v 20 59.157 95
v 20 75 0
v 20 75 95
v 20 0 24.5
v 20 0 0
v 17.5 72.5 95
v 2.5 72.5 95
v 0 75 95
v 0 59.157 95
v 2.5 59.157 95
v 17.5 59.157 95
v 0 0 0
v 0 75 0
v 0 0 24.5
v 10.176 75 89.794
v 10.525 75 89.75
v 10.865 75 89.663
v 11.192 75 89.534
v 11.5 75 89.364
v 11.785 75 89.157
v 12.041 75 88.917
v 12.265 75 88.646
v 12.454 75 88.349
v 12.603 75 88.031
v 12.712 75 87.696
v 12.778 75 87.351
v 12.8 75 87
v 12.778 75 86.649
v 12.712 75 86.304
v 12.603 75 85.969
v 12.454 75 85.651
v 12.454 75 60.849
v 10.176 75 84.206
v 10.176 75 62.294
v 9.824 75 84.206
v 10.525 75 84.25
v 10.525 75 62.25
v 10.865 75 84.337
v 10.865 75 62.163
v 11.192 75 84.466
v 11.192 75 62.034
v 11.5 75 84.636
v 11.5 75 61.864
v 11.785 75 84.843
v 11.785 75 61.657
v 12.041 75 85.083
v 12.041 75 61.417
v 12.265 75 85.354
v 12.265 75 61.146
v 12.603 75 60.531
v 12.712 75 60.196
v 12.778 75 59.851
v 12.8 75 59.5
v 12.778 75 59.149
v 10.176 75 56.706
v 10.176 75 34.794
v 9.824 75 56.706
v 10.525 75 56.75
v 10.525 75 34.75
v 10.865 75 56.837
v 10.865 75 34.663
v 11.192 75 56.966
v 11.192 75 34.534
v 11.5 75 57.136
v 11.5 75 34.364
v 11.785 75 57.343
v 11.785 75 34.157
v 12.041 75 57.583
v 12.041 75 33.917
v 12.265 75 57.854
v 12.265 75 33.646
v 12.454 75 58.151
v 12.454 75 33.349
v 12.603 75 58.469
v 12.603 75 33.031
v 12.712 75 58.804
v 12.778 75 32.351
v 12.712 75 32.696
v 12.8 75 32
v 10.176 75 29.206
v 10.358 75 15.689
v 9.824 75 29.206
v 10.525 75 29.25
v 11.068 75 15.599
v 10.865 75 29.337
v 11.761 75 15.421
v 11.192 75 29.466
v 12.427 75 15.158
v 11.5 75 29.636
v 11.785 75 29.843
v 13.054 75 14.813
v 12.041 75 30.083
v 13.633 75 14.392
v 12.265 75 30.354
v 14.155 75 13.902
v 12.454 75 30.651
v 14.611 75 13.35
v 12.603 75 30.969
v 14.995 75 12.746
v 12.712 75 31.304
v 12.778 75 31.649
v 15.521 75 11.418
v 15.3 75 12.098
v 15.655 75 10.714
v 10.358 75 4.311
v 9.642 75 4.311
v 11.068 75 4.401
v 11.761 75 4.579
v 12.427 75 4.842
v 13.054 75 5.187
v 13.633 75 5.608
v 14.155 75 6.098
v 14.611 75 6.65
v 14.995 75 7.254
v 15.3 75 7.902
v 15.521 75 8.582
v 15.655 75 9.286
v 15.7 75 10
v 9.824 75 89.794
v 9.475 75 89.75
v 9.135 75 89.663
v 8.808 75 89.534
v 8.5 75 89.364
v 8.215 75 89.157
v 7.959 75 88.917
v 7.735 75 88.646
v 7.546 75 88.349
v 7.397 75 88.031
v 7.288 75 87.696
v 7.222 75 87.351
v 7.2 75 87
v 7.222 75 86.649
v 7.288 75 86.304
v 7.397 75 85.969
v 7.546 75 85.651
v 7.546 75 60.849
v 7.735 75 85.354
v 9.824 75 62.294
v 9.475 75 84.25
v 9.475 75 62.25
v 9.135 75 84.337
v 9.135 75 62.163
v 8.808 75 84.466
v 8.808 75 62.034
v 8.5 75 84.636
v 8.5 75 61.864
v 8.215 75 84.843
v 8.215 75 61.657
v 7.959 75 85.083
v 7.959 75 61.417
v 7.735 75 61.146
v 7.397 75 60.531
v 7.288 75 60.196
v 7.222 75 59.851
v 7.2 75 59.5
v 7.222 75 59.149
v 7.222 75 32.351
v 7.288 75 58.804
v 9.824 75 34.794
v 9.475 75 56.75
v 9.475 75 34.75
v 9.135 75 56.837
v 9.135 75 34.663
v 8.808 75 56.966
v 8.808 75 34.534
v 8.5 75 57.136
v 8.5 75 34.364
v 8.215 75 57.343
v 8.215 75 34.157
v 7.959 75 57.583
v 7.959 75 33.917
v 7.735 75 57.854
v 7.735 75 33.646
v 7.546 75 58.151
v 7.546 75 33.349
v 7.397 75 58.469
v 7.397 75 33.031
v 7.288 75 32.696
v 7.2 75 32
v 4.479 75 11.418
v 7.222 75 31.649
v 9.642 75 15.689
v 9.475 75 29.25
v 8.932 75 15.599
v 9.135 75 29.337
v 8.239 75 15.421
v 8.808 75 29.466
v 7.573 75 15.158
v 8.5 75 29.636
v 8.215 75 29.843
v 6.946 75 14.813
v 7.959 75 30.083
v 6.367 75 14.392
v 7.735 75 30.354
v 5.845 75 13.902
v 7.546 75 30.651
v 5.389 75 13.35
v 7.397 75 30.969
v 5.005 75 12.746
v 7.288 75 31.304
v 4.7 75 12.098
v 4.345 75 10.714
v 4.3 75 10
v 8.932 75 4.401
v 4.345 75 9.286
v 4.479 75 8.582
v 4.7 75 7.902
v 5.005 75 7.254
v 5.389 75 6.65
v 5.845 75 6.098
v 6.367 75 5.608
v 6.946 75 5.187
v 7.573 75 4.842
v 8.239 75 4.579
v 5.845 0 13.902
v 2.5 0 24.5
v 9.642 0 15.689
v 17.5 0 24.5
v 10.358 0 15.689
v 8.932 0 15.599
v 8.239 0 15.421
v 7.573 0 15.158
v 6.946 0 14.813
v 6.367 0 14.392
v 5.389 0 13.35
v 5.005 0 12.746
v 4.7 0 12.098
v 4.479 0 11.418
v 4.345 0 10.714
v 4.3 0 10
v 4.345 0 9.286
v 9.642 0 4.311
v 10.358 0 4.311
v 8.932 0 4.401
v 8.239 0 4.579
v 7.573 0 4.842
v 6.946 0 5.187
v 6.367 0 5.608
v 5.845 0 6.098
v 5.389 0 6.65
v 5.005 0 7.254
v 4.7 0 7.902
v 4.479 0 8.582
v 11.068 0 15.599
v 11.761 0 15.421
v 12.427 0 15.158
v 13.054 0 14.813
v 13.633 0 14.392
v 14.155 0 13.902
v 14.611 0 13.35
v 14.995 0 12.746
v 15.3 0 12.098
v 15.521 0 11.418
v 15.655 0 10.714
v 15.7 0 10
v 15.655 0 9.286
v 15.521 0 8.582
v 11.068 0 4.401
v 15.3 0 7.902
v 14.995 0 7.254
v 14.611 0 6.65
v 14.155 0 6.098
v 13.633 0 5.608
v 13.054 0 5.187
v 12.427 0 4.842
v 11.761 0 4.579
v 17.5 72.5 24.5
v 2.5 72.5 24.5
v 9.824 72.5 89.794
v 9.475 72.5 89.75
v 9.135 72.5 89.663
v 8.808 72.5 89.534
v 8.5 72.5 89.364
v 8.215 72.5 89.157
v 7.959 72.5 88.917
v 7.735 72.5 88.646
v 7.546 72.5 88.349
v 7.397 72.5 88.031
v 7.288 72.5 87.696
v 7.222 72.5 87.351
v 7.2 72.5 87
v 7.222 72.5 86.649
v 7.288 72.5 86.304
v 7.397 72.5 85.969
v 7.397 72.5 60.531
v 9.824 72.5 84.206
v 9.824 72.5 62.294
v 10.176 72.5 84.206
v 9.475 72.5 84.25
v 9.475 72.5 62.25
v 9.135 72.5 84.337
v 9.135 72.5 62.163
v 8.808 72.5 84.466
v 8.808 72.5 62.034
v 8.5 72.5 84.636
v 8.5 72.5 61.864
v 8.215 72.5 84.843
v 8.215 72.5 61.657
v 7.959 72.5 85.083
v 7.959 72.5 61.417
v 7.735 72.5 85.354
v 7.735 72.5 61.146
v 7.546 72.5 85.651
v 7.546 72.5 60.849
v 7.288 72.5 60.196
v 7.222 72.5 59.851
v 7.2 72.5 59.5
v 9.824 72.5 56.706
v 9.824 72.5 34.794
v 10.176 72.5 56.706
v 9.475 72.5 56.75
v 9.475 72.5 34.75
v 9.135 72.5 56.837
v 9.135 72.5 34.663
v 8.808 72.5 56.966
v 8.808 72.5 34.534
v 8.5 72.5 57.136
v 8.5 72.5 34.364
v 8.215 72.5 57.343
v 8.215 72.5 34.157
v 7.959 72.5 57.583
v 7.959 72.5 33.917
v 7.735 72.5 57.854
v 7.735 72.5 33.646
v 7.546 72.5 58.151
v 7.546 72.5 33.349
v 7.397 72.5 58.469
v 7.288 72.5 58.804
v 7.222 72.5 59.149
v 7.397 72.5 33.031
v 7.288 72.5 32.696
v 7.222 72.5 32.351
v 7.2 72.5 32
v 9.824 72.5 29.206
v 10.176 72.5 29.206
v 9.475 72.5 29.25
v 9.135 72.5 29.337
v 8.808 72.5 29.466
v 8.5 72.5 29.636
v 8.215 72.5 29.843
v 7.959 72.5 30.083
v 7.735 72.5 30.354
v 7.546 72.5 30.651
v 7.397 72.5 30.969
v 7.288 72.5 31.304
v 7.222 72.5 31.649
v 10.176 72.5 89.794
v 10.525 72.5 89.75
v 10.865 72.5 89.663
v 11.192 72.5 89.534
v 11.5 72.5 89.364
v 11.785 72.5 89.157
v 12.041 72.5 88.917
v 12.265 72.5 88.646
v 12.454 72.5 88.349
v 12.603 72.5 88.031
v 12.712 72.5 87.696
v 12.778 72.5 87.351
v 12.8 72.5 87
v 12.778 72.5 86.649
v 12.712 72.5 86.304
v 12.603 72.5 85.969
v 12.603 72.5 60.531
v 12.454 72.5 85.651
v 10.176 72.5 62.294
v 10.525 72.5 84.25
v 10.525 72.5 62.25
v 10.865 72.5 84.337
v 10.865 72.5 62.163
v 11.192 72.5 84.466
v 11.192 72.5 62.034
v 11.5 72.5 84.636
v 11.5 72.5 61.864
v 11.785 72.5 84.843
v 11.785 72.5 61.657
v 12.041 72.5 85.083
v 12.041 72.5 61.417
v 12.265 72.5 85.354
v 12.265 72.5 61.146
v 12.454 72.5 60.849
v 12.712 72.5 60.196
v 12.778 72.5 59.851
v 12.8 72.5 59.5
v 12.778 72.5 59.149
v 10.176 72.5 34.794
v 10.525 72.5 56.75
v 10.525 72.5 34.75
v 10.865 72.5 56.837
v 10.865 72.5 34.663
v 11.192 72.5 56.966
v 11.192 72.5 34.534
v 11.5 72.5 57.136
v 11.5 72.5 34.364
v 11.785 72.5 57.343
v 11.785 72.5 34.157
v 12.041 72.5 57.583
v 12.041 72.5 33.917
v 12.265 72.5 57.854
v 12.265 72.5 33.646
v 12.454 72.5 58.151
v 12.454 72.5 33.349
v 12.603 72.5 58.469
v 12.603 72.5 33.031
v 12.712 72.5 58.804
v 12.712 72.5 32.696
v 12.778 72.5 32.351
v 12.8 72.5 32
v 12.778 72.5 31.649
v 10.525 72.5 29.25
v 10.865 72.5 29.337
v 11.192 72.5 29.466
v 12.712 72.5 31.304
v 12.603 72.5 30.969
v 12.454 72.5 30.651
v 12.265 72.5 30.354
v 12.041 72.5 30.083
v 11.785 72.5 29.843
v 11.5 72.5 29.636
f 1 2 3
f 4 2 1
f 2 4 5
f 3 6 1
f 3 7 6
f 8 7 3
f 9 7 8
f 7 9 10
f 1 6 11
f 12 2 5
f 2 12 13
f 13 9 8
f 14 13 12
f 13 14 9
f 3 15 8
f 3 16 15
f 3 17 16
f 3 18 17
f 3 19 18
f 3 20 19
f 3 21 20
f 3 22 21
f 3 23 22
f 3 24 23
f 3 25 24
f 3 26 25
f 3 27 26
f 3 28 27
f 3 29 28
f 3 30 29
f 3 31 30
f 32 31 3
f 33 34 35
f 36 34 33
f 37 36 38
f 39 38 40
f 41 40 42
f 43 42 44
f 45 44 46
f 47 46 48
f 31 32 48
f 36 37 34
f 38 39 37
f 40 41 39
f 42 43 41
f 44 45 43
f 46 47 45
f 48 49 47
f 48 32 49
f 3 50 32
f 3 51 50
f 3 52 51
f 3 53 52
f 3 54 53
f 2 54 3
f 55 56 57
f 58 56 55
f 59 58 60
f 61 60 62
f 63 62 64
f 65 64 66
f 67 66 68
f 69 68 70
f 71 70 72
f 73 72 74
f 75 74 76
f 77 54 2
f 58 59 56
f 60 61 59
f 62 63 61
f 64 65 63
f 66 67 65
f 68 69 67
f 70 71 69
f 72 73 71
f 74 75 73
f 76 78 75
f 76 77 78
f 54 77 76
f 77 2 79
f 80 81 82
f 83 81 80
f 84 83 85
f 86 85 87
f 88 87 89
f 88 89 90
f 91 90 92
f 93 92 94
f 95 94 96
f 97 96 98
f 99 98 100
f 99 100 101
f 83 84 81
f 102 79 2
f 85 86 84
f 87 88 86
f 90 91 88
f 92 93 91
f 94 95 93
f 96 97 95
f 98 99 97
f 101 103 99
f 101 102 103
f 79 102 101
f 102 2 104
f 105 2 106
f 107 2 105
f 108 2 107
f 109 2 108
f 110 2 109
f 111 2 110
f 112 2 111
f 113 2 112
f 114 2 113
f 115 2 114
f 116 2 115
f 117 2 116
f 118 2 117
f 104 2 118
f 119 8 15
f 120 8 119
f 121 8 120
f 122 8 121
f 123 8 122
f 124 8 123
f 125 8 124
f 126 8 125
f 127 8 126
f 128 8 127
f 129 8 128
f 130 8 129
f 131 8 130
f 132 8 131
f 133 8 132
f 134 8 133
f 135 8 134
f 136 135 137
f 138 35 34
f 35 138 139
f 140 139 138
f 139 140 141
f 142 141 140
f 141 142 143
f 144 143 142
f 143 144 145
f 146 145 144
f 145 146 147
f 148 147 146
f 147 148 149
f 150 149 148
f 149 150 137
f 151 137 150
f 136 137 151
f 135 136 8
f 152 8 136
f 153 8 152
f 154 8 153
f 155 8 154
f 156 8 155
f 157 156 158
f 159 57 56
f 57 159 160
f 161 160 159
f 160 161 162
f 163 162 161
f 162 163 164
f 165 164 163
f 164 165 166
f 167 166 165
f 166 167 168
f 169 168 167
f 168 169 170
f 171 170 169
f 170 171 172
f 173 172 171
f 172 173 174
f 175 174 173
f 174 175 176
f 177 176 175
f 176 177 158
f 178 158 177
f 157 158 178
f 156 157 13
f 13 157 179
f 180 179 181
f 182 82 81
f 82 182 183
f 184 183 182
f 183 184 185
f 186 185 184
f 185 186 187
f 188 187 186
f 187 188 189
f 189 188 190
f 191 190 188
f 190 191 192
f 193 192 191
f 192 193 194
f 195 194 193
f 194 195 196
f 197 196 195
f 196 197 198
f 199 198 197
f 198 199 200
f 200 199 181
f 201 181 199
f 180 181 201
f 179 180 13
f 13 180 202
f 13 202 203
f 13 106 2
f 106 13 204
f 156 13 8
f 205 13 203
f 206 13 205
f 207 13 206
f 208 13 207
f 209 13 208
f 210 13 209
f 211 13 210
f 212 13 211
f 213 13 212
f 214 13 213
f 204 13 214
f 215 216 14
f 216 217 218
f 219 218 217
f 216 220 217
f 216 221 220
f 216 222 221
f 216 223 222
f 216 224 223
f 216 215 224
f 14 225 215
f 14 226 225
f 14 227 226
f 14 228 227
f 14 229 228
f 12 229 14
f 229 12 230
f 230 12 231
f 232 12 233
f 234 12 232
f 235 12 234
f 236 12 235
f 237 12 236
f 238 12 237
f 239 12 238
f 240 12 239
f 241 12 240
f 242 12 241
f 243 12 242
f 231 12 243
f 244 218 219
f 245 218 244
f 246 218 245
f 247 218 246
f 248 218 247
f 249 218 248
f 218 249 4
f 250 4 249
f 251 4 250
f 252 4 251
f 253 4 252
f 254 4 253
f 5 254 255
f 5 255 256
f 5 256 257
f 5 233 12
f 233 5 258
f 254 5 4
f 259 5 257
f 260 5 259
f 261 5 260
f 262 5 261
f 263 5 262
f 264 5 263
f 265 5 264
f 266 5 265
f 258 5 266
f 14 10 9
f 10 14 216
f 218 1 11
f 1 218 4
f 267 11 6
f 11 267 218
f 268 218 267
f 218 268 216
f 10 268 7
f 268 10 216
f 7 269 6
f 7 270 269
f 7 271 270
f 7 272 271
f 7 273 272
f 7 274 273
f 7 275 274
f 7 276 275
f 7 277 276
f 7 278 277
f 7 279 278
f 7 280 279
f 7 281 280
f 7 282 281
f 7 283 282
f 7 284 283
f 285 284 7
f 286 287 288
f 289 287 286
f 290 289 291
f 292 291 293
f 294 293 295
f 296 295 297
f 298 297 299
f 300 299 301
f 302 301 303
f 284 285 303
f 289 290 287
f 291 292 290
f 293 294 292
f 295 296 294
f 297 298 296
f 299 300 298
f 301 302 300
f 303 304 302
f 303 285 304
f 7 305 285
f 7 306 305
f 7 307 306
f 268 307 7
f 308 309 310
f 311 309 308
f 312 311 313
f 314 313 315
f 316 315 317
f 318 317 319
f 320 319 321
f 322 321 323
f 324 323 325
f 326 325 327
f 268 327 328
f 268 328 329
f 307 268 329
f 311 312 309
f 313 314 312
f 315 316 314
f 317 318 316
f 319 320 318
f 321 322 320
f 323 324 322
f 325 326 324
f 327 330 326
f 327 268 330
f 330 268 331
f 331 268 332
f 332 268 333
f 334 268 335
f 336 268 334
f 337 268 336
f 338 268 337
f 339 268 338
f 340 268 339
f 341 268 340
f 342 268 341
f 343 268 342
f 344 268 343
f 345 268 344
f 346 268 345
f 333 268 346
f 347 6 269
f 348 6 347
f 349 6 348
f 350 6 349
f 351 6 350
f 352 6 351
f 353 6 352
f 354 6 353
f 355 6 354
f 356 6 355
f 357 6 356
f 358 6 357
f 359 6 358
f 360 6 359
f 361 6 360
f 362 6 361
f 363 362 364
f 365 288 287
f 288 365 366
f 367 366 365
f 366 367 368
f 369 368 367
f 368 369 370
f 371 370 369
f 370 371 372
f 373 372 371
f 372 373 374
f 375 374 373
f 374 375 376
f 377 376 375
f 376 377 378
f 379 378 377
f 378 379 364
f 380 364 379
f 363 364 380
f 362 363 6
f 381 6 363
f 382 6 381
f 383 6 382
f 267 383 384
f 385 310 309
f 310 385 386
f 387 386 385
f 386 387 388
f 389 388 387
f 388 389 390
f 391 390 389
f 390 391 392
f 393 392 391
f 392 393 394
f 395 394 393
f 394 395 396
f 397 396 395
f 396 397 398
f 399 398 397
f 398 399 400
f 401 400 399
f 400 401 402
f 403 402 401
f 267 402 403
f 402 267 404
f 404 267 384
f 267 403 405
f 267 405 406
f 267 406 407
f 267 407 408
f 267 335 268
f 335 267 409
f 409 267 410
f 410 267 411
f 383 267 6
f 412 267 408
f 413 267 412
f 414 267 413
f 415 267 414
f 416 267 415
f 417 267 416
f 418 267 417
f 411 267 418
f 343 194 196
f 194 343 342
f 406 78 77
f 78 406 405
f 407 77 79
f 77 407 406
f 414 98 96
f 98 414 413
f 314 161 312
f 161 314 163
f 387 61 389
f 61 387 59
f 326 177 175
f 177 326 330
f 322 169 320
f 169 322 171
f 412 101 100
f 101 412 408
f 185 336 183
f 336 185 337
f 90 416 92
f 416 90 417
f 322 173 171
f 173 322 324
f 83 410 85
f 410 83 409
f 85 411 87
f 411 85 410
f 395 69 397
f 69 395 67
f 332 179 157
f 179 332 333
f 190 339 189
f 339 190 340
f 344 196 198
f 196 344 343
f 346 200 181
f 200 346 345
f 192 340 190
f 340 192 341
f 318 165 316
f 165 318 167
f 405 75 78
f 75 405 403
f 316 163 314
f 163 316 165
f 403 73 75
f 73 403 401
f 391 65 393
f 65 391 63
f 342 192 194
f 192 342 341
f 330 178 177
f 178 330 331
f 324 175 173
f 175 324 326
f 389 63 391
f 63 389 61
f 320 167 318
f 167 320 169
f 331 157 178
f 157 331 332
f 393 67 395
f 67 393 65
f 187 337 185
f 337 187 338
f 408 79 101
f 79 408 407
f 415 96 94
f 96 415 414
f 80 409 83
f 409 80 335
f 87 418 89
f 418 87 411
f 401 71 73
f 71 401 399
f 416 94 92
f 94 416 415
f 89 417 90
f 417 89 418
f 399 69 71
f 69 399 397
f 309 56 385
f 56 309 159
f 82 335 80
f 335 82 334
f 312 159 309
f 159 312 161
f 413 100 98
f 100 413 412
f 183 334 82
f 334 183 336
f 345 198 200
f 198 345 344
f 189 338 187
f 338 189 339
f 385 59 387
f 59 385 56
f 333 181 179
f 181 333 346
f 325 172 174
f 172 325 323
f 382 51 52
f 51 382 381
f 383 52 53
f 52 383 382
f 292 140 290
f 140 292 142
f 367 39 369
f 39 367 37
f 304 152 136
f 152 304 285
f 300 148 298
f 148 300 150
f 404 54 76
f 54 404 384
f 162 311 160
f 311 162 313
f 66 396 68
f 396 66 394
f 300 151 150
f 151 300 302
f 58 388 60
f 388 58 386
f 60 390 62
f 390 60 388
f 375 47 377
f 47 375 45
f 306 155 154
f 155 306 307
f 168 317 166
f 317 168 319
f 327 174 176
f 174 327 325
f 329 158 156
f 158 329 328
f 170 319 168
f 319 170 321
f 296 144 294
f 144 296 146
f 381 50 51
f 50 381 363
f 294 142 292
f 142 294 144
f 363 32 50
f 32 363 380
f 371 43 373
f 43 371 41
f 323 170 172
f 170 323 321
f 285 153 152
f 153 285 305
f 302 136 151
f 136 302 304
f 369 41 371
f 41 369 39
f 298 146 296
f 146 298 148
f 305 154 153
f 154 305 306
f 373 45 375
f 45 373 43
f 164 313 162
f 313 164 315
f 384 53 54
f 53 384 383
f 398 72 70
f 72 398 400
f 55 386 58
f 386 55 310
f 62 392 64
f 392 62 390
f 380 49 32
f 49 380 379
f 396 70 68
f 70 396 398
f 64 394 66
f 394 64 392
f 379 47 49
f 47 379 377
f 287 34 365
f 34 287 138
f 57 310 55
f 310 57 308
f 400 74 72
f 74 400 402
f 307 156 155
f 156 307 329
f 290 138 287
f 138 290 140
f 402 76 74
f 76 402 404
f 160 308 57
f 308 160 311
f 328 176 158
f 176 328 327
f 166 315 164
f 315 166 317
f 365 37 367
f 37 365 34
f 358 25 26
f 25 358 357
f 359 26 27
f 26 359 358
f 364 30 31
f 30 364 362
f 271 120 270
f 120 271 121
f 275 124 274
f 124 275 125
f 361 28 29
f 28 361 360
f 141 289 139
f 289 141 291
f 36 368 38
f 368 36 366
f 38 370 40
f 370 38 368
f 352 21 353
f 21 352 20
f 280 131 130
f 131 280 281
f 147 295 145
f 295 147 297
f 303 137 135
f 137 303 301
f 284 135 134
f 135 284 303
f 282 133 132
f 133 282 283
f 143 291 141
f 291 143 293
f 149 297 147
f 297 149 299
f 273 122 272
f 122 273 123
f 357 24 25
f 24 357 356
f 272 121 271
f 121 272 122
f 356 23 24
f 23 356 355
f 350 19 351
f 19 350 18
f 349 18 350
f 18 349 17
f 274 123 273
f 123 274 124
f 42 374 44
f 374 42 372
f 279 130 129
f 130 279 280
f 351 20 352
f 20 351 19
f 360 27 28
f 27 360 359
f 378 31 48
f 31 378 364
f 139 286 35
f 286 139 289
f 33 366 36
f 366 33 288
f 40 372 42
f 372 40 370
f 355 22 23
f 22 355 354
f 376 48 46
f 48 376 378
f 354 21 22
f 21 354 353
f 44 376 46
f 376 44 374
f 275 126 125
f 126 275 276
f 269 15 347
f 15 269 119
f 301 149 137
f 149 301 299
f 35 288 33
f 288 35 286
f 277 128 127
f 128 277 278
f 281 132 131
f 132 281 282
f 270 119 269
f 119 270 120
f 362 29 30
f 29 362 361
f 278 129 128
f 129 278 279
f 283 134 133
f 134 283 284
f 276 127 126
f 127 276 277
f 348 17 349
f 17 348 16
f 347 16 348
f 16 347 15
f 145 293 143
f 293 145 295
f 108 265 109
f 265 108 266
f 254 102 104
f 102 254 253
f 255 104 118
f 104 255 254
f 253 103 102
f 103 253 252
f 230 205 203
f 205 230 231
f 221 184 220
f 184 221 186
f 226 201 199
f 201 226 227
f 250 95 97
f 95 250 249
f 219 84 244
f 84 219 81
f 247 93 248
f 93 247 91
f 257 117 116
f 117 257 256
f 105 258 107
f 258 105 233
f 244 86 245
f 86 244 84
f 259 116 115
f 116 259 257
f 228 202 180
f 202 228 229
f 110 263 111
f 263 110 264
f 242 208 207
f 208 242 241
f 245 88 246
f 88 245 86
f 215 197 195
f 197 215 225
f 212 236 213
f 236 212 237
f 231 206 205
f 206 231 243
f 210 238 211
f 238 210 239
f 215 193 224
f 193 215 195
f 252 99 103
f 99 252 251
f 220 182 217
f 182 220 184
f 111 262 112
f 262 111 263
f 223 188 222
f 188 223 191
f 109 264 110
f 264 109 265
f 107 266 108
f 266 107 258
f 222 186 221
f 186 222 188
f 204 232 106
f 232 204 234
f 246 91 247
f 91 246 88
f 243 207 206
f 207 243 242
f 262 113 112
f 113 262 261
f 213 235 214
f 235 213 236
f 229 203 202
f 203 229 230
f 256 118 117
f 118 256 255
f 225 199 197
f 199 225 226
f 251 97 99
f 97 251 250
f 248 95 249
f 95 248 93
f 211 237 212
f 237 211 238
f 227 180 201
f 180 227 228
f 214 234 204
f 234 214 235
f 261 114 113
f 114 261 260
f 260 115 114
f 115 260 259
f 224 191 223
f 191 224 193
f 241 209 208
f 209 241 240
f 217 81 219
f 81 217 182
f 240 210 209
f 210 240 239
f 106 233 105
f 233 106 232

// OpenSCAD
$fn = 50;
difference(){
    union(){
        cube([20,75,75+20]);
    }
    translate([-5,0,4.5+20])rotate([50,0,0]) cube([30,120,75]);
    translate([2.5,-2.5,4.5+20]) cube([15,75,75]);
    translate([10,80,12+20]) rotate([90,0,0]) #cylinder(15,d=5+0.6);
    translate([10,80,39.5+20]) rotate([90,0,0]) #cylinder(15,d=5+0.6);
    translate([10,80,67+20]) rotate([90,0,0]) #cylinder(15,d=5+0.6);
    translate([10,80,10]) rotate([90,0,0]) #cylinder(85,d=11+0.4);
}
